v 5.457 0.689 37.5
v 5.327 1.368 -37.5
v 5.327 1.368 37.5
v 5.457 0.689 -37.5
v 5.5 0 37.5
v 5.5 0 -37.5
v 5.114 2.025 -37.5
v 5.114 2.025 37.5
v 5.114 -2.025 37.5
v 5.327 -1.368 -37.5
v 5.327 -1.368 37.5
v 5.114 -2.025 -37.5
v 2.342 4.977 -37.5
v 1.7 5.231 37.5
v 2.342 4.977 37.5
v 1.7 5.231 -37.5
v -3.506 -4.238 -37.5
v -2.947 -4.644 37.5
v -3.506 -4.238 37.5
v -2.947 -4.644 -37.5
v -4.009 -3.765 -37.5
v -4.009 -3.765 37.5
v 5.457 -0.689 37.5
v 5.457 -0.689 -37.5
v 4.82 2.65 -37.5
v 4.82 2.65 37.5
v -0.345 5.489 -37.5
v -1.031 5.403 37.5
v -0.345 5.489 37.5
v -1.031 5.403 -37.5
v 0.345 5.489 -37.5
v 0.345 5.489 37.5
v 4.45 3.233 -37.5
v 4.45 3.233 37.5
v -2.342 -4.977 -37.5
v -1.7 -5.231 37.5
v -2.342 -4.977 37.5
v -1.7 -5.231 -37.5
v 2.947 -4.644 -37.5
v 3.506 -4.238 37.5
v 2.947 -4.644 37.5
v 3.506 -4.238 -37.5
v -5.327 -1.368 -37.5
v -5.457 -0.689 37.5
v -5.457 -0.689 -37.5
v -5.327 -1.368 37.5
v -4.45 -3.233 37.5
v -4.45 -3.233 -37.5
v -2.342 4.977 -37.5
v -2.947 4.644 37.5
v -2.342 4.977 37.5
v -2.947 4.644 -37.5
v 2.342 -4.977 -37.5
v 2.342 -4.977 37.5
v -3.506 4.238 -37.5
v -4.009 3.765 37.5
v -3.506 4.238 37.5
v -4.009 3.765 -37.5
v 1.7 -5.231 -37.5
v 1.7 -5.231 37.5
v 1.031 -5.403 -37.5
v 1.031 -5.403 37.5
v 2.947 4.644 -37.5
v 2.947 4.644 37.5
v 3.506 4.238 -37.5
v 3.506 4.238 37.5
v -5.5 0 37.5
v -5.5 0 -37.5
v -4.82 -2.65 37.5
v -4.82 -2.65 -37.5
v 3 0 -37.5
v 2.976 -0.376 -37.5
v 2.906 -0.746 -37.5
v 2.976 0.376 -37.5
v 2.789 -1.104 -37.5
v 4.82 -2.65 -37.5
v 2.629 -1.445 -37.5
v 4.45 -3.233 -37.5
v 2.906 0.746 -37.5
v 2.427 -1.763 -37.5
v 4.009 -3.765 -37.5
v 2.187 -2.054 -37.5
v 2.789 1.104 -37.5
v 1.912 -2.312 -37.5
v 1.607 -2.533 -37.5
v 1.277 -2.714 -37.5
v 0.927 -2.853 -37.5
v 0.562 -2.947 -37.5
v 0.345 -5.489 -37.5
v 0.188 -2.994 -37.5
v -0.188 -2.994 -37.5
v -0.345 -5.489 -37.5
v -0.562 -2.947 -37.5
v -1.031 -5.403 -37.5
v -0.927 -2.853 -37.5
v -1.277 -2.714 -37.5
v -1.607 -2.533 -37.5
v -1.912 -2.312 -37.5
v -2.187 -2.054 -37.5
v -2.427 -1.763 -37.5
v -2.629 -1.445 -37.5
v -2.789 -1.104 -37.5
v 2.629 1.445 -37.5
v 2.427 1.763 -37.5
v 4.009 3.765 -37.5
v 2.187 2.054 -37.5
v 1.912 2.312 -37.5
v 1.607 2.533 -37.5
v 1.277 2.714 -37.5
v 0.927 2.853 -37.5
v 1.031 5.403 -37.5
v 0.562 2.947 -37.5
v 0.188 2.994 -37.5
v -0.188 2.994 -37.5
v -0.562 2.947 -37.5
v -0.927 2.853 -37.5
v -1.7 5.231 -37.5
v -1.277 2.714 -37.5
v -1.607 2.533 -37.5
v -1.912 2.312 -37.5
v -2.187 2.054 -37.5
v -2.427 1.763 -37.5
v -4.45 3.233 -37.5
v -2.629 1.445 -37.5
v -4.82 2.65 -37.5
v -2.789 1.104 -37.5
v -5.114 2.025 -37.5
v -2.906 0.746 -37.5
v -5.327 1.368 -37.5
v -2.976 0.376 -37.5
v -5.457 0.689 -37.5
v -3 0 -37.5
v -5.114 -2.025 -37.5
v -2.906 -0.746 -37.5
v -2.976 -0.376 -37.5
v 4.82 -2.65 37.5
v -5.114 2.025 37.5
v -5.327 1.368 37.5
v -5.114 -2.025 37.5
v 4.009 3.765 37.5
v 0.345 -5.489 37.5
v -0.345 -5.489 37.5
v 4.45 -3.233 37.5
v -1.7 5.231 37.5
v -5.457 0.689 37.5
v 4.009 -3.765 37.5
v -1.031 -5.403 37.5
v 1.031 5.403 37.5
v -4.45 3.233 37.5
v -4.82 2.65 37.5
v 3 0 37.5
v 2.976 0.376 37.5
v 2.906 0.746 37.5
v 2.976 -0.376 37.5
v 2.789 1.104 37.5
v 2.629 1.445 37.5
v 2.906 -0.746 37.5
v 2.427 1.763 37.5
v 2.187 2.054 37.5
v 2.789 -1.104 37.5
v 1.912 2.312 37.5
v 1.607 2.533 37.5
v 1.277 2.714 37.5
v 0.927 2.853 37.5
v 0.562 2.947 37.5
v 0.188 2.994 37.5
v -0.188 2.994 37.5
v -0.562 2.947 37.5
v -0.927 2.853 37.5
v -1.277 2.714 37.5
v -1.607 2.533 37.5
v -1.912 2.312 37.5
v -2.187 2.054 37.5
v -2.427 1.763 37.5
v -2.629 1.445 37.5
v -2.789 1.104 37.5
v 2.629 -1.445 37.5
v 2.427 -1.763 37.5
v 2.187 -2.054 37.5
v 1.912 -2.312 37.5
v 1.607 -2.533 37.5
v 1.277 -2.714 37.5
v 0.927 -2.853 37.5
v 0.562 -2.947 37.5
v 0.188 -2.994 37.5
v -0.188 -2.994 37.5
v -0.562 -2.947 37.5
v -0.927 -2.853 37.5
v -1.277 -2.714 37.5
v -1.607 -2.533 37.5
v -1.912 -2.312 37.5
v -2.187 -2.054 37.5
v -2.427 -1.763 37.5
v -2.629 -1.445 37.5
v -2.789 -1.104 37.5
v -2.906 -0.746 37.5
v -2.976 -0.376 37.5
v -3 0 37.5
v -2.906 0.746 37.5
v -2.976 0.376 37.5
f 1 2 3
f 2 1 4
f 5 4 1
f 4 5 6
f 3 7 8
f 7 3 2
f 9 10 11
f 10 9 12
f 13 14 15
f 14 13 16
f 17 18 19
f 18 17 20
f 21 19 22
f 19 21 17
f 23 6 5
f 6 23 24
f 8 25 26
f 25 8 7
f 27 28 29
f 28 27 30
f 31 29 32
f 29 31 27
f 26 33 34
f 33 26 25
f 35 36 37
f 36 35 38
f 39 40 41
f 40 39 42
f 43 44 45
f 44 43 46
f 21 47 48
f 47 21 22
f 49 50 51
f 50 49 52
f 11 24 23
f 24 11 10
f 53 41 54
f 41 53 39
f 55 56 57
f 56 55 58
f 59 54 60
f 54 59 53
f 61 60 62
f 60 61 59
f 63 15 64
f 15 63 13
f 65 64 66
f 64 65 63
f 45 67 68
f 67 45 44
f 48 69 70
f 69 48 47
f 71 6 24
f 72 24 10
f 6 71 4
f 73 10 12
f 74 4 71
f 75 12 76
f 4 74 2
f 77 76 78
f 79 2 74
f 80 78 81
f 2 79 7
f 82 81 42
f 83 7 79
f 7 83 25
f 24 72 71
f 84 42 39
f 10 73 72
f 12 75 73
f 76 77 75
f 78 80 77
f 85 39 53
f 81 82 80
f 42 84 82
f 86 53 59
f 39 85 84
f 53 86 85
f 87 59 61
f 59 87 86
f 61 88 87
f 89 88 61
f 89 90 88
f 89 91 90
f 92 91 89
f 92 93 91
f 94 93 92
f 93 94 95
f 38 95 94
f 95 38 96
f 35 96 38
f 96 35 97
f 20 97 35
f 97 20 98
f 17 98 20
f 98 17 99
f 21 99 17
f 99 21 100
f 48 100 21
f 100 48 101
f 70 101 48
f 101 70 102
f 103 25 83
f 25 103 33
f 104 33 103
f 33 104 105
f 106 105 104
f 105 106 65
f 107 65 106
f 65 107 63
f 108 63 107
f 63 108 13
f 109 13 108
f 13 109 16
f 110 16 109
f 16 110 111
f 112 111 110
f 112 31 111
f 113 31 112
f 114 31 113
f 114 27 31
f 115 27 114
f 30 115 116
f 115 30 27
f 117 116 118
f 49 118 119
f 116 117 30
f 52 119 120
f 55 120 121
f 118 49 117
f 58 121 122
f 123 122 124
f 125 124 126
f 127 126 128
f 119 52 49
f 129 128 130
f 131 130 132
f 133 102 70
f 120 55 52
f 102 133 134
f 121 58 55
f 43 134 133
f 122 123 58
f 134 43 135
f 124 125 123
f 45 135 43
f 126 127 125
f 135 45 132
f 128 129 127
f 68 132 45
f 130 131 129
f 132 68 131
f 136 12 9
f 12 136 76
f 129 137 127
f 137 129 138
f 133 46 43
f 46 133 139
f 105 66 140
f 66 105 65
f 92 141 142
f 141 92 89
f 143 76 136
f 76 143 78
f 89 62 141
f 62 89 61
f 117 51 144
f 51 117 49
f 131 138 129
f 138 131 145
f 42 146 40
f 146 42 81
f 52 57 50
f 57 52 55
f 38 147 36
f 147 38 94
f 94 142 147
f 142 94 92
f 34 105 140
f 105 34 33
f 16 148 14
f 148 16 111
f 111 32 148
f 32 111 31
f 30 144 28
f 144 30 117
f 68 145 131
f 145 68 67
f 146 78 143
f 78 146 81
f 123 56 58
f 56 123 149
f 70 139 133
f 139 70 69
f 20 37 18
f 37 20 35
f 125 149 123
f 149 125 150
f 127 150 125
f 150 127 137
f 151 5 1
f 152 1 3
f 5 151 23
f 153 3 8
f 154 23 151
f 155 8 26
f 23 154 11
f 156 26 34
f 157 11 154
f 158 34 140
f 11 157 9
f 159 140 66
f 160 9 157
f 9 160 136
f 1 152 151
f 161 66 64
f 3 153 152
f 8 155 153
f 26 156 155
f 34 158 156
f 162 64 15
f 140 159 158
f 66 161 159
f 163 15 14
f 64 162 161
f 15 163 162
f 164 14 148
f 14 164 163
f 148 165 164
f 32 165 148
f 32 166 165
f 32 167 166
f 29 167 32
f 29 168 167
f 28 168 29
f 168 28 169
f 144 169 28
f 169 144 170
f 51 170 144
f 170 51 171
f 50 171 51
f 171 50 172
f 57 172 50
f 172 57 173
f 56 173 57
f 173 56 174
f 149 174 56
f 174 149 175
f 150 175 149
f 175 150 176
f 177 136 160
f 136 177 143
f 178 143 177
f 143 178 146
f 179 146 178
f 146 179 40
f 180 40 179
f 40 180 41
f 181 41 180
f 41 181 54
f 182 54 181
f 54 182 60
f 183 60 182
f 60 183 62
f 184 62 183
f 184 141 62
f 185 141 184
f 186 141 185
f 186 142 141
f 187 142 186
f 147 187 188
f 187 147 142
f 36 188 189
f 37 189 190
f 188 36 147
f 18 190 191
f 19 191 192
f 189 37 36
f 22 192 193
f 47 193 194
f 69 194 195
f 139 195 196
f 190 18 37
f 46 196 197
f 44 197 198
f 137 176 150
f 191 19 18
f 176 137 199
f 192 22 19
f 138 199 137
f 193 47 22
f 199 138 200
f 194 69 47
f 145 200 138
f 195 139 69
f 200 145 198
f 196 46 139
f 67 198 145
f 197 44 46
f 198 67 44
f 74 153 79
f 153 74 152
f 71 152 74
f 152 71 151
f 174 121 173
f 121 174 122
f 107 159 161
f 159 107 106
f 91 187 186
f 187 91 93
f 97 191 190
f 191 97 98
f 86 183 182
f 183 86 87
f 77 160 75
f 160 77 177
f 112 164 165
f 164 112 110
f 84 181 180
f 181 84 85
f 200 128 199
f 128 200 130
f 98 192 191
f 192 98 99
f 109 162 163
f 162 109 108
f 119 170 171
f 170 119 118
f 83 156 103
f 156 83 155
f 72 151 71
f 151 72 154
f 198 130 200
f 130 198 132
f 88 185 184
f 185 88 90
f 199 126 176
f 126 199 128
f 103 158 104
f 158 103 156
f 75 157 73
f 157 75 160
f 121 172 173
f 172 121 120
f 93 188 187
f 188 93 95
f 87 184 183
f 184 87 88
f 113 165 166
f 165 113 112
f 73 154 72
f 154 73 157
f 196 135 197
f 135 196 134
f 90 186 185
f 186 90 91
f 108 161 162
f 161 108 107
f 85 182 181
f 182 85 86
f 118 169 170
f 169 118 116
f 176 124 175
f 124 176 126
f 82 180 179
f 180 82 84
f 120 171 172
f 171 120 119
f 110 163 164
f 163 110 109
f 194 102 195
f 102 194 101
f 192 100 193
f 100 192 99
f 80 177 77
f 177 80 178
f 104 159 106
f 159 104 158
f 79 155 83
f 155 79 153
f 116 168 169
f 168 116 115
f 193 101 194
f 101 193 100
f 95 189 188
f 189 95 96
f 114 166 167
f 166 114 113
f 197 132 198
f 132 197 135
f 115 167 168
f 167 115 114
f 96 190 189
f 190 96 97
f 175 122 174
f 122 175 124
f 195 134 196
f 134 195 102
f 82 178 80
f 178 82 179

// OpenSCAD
$fn = 50;


difference() {
	union() {
		translate(v = [0, 0, -37.5000000000]) {
			cylinder(h = 75, r = 5.5000000000);
		}
	}
	union() {
		translate(v = [0, 0, -100.0000000000]) {
			cylinder(h = 200, r = 3.0000000000);
		}
	}
}
